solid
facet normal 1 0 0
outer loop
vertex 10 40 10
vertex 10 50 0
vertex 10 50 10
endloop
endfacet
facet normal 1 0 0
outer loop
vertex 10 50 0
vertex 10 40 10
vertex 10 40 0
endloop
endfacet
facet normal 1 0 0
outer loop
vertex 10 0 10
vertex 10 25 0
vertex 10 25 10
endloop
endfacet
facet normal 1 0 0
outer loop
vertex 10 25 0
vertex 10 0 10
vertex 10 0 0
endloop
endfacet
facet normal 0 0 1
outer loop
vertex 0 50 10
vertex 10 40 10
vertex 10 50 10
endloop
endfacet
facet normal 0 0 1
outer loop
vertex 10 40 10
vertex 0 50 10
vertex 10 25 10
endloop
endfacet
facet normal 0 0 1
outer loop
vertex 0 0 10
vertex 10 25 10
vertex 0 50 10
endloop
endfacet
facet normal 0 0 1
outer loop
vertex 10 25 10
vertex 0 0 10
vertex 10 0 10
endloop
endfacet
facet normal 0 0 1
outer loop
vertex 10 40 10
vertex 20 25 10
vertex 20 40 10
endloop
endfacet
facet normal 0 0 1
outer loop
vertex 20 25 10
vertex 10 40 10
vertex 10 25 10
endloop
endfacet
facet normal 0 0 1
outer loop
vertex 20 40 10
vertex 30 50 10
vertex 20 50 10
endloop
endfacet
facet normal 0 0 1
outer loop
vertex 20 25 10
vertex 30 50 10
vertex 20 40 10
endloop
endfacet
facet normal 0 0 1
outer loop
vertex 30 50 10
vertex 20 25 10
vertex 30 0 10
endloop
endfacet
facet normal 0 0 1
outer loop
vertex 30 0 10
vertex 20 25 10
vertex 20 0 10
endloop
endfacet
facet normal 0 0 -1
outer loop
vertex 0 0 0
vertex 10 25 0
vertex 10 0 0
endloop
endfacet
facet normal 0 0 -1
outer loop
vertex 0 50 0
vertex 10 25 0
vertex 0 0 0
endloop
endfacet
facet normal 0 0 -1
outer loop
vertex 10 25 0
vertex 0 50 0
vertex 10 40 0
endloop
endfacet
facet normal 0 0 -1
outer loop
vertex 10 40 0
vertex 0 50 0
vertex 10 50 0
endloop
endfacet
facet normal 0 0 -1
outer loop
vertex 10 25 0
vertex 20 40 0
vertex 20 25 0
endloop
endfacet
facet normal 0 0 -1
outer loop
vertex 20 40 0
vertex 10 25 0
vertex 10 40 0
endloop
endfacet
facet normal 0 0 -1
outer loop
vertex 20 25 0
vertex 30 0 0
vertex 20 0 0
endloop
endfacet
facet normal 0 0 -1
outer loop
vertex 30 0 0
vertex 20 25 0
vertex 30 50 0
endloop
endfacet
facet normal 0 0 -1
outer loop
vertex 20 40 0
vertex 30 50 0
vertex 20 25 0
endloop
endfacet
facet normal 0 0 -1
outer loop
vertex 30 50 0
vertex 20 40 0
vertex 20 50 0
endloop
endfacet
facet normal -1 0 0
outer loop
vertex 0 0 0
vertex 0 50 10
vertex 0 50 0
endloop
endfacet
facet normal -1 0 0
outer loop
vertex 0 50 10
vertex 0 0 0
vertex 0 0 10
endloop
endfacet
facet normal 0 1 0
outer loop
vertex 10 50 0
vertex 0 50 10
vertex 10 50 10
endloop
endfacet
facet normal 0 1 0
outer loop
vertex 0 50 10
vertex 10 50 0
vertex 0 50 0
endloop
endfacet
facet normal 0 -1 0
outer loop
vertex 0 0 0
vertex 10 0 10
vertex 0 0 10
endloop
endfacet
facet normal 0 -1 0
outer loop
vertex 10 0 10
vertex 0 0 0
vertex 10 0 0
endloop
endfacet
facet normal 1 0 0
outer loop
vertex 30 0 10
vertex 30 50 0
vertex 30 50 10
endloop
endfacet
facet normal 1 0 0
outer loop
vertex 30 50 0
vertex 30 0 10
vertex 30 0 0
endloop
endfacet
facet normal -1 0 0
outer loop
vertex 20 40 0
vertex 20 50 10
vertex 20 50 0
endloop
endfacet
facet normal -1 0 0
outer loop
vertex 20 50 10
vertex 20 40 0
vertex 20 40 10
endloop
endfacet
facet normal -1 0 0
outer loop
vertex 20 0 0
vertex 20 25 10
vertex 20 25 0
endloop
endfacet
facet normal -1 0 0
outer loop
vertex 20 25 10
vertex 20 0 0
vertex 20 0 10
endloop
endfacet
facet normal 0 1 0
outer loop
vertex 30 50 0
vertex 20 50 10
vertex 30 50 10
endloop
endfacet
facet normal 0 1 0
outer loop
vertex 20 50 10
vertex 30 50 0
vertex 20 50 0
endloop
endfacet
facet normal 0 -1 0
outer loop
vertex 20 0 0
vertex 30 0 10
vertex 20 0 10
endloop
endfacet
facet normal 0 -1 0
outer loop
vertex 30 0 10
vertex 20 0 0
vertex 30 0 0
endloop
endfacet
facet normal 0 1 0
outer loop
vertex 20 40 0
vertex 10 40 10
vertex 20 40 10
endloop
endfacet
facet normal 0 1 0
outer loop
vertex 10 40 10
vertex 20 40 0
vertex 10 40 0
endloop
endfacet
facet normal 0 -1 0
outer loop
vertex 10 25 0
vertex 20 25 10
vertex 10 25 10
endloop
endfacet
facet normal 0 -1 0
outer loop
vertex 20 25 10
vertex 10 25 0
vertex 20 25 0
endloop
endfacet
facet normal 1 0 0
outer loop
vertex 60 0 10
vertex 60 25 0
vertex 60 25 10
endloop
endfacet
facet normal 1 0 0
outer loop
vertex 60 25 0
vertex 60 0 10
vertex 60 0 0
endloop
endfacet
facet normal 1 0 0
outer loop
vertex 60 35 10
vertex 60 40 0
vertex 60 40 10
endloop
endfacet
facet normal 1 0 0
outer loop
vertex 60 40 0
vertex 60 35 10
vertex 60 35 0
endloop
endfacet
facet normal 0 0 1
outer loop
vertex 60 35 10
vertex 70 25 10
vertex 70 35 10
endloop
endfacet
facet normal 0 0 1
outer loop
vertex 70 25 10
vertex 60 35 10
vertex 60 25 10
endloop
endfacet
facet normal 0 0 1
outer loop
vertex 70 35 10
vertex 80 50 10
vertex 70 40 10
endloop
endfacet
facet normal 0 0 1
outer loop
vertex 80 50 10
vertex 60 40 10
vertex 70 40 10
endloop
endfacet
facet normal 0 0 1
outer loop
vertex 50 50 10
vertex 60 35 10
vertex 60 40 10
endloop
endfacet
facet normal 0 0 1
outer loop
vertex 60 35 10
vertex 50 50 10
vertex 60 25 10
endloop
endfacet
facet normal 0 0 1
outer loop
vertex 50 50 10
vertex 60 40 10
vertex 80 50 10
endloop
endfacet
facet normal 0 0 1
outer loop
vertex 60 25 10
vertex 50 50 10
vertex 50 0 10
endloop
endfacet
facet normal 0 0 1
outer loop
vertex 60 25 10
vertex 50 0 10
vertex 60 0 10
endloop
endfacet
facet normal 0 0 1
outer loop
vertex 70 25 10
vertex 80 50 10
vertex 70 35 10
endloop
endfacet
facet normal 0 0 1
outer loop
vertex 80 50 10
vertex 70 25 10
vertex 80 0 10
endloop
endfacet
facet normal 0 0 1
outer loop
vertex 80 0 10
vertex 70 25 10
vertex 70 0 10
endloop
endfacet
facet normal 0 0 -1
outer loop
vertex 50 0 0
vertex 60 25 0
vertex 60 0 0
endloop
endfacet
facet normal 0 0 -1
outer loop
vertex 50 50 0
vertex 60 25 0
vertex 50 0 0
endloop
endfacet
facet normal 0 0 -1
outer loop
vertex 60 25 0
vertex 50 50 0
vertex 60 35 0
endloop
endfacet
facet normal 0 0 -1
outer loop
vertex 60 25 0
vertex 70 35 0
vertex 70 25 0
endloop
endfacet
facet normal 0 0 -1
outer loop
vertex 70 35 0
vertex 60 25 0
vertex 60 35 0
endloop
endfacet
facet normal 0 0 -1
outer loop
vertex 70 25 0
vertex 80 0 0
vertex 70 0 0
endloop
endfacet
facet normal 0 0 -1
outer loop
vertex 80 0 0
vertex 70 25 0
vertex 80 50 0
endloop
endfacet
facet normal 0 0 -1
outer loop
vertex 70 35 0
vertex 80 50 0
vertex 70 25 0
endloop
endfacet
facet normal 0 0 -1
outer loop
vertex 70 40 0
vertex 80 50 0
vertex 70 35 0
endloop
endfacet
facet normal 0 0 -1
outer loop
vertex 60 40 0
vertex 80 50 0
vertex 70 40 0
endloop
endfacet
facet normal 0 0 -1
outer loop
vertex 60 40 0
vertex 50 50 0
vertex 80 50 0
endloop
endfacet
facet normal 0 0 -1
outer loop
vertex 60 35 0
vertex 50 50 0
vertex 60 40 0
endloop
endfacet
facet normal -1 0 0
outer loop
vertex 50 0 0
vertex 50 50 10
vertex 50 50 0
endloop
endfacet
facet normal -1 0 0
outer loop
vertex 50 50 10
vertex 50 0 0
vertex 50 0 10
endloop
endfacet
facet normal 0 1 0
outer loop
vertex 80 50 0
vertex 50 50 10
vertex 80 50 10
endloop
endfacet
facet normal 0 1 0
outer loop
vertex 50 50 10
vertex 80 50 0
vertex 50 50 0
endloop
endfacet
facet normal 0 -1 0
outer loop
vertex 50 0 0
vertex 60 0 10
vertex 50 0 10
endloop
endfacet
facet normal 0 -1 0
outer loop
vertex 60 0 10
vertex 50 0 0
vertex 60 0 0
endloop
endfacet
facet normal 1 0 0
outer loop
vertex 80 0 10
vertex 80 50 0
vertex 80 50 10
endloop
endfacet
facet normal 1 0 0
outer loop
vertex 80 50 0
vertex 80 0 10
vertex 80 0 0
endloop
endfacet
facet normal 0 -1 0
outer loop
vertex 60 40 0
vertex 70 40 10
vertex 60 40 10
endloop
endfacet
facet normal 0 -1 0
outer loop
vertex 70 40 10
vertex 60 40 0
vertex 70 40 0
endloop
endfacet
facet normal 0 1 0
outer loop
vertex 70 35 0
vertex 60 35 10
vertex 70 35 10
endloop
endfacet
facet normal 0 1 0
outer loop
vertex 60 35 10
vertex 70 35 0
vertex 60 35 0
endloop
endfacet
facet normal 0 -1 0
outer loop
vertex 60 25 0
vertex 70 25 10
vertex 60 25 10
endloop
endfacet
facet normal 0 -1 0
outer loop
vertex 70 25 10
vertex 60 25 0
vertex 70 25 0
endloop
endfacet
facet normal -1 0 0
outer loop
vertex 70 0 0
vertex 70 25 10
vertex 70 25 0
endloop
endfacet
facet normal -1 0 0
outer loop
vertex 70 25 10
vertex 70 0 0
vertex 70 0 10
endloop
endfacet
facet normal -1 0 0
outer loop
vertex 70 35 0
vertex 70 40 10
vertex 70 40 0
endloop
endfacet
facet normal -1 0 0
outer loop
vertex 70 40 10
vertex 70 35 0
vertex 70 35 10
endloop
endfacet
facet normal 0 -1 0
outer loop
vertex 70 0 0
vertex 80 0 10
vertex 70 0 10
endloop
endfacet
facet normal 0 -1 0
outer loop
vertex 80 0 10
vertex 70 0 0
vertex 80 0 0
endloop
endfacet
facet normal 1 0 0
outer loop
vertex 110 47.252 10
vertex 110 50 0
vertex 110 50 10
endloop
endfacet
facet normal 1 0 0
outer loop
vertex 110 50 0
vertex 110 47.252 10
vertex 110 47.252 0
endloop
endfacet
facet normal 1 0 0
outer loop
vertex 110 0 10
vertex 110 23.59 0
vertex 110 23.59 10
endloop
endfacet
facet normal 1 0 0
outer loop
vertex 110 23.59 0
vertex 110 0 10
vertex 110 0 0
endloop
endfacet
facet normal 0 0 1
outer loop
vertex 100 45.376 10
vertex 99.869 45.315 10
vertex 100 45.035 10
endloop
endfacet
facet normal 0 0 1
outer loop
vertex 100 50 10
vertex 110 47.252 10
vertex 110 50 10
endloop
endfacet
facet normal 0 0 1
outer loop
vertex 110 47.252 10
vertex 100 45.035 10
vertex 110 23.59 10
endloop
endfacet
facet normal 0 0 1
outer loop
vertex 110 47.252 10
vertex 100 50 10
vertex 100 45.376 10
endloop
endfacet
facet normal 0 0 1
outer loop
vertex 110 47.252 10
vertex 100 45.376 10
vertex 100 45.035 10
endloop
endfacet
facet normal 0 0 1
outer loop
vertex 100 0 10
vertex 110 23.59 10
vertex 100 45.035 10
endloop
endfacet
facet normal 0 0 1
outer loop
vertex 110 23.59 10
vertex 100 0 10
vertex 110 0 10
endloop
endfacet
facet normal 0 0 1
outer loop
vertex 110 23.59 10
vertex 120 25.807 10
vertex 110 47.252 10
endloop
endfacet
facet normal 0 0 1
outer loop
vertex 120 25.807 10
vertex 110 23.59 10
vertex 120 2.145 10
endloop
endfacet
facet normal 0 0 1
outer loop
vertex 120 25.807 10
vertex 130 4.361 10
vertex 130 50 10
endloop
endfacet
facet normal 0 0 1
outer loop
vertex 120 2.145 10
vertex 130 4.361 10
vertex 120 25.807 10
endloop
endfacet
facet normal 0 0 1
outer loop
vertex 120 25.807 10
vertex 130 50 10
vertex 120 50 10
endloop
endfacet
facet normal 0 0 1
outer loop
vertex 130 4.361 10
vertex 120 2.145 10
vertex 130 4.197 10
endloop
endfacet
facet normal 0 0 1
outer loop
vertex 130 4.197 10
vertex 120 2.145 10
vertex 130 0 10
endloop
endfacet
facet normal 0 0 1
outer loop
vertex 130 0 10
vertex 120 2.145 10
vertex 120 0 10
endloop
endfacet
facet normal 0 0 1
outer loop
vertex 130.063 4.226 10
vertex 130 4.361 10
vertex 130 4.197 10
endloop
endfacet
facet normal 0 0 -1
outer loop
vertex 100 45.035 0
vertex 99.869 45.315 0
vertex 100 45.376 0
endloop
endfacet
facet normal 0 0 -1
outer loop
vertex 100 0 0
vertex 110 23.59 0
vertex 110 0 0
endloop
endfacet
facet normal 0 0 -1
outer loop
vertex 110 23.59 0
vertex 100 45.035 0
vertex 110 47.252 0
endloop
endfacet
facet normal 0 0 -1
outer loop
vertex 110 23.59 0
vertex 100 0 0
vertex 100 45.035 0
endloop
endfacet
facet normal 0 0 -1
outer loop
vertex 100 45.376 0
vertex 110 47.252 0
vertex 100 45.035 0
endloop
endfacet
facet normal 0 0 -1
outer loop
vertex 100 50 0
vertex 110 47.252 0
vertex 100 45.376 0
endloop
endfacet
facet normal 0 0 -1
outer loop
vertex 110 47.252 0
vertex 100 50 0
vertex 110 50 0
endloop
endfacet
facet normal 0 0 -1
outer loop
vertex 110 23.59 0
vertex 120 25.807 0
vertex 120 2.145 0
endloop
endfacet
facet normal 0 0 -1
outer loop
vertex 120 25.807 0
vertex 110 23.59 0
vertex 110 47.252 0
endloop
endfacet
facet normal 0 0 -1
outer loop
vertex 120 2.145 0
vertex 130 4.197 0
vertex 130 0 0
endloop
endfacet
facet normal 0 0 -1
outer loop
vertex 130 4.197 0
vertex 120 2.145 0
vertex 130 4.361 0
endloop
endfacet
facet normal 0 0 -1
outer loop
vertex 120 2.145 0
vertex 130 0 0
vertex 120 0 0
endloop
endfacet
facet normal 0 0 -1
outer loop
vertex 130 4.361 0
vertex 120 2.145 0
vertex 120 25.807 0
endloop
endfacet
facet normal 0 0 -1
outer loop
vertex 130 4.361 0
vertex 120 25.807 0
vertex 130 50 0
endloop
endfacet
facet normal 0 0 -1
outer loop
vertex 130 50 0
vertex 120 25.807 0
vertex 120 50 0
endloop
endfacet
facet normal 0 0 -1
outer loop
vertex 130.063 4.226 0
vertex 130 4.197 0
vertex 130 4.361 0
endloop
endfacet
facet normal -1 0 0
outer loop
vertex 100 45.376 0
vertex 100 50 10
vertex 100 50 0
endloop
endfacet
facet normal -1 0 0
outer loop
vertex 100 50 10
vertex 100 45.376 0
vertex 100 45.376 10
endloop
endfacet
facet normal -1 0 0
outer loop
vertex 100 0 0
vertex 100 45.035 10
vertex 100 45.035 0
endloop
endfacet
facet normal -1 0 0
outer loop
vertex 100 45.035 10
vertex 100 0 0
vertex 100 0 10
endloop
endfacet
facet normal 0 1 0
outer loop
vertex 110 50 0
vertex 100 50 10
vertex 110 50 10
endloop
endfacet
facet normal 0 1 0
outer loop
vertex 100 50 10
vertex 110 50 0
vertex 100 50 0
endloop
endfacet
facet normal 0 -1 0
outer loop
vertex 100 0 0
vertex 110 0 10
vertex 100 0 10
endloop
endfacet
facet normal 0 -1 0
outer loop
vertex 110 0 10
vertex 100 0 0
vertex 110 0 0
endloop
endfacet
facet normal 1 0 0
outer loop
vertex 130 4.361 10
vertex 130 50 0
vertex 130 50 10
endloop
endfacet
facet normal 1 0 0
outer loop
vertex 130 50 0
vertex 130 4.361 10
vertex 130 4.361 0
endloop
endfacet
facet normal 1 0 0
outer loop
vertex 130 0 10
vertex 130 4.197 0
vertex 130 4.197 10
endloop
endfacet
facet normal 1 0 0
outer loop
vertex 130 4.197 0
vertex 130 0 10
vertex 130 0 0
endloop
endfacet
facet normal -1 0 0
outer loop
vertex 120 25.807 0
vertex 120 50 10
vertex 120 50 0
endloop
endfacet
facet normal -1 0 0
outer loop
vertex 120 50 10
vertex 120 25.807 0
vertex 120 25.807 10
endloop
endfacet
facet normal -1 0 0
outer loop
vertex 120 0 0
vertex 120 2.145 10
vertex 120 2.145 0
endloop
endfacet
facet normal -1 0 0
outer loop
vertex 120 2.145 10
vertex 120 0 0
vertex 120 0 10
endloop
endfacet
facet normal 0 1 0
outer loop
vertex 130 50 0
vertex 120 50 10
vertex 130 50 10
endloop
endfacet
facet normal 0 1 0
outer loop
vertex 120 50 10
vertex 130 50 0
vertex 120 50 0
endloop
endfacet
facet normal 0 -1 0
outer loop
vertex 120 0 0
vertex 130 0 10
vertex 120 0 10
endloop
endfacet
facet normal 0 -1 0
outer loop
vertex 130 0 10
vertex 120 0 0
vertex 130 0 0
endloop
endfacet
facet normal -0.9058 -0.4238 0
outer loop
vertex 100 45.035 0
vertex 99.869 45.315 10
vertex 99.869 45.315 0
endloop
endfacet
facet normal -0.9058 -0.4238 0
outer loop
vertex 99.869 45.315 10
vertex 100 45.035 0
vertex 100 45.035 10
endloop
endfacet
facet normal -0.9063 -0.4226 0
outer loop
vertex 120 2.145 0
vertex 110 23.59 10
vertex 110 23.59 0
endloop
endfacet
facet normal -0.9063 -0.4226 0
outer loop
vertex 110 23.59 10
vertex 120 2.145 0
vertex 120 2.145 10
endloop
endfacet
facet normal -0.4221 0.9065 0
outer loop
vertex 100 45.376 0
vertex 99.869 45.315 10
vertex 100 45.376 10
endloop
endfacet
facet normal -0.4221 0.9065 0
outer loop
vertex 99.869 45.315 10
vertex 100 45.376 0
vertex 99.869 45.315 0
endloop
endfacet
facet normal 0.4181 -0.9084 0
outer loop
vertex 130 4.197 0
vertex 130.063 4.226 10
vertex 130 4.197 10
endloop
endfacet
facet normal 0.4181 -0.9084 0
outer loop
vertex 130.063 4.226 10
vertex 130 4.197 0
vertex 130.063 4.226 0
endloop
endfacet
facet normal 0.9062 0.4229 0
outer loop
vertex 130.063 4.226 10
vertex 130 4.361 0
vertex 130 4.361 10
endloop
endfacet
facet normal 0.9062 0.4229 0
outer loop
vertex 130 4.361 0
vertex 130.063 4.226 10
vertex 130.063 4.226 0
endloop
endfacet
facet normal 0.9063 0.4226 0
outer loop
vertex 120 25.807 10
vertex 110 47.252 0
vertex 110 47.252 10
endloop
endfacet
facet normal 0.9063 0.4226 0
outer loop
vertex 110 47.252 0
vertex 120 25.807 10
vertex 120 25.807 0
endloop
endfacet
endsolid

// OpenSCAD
union(){
    translate(v=[0, 0, 0]){
        color("red"){
            union(){
                cube(size=[10, 50, 10]);
                translate(v=[20, 0, 0]){
                    cube(size=[10, 50, 10]);
                };
                translate(v=[10, 25, 0]){
                    cube(size=[10, 15.0, 10]);
                };
            };
        };
    };
    translate(v=[50, 0, 0]){
        color("blue"){
            union(){
                cube(size=[10, 50, 10]);
                translate(v=[0, 40, 0]){
                    cube(size=[30, 10, 10]);
                };
                translate(v=[0, 25, 0]){
                    cube(size=[30, 10, 10]);
                };
                translate(v=[20, 0, 0]){
                    cube(size=[10, 50, 10]);
                };
            };
        };
    };
    translate(v=[100, 0, 0]){
        color("red"){
            union(){
                cube(size=[10, 50, 10]);
                translate(v=[20, 0, 0]){
                    cube(size=[10, 50, 10]);
                };
                translate(v=[21, 0, 0]){
                    rotate(a=[0, 0, 25]){
                        cube(size=[10, 50, 10]);
                    };
                };
            };
        };
    };
};
